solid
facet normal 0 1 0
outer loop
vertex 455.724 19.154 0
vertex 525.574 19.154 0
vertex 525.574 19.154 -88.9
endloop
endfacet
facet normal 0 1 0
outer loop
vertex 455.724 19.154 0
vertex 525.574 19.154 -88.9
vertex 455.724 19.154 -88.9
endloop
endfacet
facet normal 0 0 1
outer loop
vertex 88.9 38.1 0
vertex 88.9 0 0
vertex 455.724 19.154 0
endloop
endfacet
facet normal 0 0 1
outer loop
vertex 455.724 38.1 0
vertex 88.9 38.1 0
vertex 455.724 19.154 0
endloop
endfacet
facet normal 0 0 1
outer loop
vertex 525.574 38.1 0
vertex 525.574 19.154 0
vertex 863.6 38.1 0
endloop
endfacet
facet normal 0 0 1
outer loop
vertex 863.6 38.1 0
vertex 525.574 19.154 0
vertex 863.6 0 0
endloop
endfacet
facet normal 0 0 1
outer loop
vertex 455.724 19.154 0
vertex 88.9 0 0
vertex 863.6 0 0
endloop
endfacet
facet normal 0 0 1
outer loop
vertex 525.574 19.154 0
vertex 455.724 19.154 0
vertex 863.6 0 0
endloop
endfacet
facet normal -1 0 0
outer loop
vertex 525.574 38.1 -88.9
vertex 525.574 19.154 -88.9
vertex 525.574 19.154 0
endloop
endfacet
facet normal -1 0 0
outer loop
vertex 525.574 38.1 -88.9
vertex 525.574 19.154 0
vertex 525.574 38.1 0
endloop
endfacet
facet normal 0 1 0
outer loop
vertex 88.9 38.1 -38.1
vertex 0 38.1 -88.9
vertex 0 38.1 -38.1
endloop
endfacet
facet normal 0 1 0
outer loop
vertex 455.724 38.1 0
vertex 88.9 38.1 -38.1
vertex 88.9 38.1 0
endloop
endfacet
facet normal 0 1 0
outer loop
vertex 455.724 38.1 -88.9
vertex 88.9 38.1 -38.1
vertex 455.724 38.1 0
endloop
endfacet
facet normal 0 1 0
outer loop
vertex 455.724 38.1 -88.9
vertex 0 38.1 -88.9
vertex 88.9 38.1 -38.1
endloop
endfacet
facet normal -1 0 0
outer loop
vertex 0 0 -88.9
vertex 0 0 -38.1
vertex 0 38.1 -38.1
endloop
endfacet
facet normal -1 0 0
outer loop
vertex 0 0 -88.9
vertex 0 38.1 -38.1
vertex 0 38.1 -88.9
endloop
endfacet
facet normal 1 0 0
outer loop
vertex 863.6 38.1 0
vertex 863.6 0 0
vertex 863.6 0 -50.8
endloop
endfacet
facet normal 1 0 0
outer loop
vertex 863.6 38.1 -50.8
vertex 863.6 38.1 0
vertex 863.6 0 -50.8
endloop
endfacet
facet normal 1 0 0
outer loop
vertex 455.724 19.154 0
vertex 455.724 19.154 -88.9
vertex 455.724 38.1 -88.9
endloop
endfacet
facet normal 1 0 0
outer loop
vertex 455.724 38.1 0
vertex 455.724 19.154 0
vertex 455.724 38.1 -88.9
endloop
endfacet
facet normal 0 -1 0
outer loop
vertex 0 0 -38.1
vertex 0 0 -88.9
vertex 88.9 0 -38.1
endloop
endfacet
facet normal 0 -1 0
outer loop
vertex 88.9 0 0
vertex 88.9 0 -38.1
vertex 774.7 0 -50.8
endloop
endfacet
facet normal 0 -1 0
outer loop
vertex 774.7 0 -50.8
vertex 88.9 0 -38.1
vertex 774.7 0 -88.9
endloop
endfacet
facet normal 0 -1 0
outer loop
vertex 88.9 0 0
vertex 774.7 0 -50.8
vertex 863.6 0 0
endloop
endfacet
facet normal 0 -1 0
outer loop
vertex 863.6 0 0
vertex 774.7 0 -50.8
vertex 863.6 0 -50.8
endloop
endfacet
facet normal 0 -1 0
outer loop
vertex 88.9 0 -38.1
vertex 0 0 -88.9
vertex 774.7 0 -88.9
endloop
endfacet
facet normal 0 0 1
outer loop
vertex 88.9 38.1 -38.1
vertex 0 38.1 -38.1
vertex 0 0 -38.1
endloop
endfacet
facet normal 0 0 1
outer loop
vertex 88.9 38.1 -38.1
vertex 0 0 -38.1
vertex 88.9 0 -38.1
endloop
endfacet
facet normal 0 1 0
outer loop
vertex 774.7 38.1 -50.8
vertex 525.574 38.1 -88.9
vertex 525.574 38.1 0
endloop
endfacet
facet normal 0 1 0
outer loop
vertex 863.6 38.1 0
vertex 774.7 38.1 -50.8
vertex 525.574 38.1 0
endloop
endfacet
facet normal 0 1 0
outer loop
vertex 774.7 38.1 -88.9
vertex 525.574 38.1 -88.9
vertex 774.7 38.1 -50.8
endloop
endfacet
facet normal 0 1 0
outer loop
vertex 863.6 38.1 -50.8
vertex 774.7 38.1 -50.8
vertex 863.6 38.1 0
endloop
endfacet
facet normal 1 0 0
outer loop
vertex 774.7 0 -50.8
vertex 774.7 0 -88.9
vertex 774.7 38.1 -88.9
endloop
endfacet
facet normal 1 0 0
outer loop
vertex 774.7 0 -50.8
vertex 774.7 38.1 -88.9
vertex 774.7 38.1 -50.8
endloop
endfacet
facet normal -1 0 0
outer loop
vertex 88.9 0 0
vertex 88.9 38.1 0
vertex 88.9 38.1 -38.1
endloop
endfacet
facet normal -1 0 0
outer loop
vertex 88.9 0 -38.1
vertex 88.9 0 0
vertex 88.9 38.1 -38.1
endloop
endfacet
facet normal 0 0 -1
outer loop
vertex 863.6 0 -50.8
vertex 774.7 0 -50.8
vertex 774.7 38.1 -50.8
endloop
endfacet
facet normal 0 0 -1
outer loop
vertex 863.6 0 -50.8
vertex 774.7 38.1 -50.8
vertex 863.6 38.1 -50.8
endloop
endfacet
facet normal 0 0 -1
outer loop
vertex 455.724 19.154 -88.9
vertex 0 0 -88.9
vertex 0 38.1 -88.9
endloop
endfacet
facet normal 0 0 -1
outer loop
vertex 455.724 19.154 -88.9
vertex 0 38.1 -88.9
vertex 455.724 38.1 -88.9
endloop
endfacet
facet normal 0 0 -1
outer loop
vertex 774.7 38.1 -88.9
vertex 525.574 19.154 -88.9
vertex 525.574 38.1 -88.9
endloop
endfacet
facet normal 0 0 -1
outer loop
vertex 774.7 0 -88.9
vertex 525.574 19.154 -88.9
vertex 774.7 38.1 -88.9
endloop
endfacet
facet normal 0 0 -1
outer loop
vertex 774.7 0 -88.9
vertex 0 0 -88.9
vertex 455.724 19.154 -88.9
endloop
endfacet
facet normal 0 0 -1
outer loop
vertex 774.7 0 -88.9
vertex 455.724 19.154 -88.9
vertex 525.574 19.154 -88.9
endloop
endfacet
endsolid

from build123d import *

# Parameters (mm, degrees)
SKETCH1_W           = 863.6
SKETCH1_H           = 88.9
BOSS_EXTRUDE1_DEPTH = 38.1
SKETCH3_W           = 88.9
SKETCH3_H           = 38.1
CUT_EXTRUDE2_DEPTH  = 39.1
SKETCH2_W           = 88.9
SKETCH2_H           = 38.1
CUT_EXTRUDE3_DEPTH  = 39.1
SKETCH4_W           = 69.85
SKETCH4_H           = 18.945503639
CUT_EXTRUDE4_DEPTH  = 89.9


with BuildPart() as part:
    # Sketch1 → Boss-Extrude1 (new body)
    with BuildSketch(Plane(origin=(0, 0, 0), x_dir=(1, 0, 0), z_dir=(0, 1, 0))):
        with Locations((431.8, 44.45)):
            Rectangle(SKETCH1_W, SKETCH1_H)
    extrude(amount=BOSS_EXTRUDE1_DEPTH)

    # Sketch3 → Cut-Extrude2 (cut, through all)
    with BuildSketch(Plane(origin=(0, 38.1, 0), x_dir=(1, 0, 0), z_dir=(0, 1, 0))):
        with Locations((44.45, 19.05)):
            Rectangle(SKETCH3_W, SKETCH3_H)
    extrude(amount=-CUT_EXTRUDE2_DEPTH, mode=Mode.SUBTRACT)

    # Sketch2 → Cut-Extrude3 (cut, through all)
    with BuildSketch(Plane.XZ):
        with Locations((819.15, -69.85)):
            Rectangle(SKETCH2_W, SKETCH2_H)
    extrude(amount=-CUT_EXTRUDE3_DEPTH, mode=Mode.SUBTRACT)

    # Sketch4 → Cut-Extrude4 (cut, through all)
    with BuildSketch(Plane(origin=(0, 0, -88.9), x_dir=(-1, 0, 0), z_dir=(0, 0, -1))):
        with Locations((-490.648634291, 28.627248181)):
            Rectangle(SKETCH4_W, SKETCH4_H)
    extrude(amount=-CUT_EXTRUDE4_DEPTH, mode=Mode.SUBTRACT)


solid = part.part
